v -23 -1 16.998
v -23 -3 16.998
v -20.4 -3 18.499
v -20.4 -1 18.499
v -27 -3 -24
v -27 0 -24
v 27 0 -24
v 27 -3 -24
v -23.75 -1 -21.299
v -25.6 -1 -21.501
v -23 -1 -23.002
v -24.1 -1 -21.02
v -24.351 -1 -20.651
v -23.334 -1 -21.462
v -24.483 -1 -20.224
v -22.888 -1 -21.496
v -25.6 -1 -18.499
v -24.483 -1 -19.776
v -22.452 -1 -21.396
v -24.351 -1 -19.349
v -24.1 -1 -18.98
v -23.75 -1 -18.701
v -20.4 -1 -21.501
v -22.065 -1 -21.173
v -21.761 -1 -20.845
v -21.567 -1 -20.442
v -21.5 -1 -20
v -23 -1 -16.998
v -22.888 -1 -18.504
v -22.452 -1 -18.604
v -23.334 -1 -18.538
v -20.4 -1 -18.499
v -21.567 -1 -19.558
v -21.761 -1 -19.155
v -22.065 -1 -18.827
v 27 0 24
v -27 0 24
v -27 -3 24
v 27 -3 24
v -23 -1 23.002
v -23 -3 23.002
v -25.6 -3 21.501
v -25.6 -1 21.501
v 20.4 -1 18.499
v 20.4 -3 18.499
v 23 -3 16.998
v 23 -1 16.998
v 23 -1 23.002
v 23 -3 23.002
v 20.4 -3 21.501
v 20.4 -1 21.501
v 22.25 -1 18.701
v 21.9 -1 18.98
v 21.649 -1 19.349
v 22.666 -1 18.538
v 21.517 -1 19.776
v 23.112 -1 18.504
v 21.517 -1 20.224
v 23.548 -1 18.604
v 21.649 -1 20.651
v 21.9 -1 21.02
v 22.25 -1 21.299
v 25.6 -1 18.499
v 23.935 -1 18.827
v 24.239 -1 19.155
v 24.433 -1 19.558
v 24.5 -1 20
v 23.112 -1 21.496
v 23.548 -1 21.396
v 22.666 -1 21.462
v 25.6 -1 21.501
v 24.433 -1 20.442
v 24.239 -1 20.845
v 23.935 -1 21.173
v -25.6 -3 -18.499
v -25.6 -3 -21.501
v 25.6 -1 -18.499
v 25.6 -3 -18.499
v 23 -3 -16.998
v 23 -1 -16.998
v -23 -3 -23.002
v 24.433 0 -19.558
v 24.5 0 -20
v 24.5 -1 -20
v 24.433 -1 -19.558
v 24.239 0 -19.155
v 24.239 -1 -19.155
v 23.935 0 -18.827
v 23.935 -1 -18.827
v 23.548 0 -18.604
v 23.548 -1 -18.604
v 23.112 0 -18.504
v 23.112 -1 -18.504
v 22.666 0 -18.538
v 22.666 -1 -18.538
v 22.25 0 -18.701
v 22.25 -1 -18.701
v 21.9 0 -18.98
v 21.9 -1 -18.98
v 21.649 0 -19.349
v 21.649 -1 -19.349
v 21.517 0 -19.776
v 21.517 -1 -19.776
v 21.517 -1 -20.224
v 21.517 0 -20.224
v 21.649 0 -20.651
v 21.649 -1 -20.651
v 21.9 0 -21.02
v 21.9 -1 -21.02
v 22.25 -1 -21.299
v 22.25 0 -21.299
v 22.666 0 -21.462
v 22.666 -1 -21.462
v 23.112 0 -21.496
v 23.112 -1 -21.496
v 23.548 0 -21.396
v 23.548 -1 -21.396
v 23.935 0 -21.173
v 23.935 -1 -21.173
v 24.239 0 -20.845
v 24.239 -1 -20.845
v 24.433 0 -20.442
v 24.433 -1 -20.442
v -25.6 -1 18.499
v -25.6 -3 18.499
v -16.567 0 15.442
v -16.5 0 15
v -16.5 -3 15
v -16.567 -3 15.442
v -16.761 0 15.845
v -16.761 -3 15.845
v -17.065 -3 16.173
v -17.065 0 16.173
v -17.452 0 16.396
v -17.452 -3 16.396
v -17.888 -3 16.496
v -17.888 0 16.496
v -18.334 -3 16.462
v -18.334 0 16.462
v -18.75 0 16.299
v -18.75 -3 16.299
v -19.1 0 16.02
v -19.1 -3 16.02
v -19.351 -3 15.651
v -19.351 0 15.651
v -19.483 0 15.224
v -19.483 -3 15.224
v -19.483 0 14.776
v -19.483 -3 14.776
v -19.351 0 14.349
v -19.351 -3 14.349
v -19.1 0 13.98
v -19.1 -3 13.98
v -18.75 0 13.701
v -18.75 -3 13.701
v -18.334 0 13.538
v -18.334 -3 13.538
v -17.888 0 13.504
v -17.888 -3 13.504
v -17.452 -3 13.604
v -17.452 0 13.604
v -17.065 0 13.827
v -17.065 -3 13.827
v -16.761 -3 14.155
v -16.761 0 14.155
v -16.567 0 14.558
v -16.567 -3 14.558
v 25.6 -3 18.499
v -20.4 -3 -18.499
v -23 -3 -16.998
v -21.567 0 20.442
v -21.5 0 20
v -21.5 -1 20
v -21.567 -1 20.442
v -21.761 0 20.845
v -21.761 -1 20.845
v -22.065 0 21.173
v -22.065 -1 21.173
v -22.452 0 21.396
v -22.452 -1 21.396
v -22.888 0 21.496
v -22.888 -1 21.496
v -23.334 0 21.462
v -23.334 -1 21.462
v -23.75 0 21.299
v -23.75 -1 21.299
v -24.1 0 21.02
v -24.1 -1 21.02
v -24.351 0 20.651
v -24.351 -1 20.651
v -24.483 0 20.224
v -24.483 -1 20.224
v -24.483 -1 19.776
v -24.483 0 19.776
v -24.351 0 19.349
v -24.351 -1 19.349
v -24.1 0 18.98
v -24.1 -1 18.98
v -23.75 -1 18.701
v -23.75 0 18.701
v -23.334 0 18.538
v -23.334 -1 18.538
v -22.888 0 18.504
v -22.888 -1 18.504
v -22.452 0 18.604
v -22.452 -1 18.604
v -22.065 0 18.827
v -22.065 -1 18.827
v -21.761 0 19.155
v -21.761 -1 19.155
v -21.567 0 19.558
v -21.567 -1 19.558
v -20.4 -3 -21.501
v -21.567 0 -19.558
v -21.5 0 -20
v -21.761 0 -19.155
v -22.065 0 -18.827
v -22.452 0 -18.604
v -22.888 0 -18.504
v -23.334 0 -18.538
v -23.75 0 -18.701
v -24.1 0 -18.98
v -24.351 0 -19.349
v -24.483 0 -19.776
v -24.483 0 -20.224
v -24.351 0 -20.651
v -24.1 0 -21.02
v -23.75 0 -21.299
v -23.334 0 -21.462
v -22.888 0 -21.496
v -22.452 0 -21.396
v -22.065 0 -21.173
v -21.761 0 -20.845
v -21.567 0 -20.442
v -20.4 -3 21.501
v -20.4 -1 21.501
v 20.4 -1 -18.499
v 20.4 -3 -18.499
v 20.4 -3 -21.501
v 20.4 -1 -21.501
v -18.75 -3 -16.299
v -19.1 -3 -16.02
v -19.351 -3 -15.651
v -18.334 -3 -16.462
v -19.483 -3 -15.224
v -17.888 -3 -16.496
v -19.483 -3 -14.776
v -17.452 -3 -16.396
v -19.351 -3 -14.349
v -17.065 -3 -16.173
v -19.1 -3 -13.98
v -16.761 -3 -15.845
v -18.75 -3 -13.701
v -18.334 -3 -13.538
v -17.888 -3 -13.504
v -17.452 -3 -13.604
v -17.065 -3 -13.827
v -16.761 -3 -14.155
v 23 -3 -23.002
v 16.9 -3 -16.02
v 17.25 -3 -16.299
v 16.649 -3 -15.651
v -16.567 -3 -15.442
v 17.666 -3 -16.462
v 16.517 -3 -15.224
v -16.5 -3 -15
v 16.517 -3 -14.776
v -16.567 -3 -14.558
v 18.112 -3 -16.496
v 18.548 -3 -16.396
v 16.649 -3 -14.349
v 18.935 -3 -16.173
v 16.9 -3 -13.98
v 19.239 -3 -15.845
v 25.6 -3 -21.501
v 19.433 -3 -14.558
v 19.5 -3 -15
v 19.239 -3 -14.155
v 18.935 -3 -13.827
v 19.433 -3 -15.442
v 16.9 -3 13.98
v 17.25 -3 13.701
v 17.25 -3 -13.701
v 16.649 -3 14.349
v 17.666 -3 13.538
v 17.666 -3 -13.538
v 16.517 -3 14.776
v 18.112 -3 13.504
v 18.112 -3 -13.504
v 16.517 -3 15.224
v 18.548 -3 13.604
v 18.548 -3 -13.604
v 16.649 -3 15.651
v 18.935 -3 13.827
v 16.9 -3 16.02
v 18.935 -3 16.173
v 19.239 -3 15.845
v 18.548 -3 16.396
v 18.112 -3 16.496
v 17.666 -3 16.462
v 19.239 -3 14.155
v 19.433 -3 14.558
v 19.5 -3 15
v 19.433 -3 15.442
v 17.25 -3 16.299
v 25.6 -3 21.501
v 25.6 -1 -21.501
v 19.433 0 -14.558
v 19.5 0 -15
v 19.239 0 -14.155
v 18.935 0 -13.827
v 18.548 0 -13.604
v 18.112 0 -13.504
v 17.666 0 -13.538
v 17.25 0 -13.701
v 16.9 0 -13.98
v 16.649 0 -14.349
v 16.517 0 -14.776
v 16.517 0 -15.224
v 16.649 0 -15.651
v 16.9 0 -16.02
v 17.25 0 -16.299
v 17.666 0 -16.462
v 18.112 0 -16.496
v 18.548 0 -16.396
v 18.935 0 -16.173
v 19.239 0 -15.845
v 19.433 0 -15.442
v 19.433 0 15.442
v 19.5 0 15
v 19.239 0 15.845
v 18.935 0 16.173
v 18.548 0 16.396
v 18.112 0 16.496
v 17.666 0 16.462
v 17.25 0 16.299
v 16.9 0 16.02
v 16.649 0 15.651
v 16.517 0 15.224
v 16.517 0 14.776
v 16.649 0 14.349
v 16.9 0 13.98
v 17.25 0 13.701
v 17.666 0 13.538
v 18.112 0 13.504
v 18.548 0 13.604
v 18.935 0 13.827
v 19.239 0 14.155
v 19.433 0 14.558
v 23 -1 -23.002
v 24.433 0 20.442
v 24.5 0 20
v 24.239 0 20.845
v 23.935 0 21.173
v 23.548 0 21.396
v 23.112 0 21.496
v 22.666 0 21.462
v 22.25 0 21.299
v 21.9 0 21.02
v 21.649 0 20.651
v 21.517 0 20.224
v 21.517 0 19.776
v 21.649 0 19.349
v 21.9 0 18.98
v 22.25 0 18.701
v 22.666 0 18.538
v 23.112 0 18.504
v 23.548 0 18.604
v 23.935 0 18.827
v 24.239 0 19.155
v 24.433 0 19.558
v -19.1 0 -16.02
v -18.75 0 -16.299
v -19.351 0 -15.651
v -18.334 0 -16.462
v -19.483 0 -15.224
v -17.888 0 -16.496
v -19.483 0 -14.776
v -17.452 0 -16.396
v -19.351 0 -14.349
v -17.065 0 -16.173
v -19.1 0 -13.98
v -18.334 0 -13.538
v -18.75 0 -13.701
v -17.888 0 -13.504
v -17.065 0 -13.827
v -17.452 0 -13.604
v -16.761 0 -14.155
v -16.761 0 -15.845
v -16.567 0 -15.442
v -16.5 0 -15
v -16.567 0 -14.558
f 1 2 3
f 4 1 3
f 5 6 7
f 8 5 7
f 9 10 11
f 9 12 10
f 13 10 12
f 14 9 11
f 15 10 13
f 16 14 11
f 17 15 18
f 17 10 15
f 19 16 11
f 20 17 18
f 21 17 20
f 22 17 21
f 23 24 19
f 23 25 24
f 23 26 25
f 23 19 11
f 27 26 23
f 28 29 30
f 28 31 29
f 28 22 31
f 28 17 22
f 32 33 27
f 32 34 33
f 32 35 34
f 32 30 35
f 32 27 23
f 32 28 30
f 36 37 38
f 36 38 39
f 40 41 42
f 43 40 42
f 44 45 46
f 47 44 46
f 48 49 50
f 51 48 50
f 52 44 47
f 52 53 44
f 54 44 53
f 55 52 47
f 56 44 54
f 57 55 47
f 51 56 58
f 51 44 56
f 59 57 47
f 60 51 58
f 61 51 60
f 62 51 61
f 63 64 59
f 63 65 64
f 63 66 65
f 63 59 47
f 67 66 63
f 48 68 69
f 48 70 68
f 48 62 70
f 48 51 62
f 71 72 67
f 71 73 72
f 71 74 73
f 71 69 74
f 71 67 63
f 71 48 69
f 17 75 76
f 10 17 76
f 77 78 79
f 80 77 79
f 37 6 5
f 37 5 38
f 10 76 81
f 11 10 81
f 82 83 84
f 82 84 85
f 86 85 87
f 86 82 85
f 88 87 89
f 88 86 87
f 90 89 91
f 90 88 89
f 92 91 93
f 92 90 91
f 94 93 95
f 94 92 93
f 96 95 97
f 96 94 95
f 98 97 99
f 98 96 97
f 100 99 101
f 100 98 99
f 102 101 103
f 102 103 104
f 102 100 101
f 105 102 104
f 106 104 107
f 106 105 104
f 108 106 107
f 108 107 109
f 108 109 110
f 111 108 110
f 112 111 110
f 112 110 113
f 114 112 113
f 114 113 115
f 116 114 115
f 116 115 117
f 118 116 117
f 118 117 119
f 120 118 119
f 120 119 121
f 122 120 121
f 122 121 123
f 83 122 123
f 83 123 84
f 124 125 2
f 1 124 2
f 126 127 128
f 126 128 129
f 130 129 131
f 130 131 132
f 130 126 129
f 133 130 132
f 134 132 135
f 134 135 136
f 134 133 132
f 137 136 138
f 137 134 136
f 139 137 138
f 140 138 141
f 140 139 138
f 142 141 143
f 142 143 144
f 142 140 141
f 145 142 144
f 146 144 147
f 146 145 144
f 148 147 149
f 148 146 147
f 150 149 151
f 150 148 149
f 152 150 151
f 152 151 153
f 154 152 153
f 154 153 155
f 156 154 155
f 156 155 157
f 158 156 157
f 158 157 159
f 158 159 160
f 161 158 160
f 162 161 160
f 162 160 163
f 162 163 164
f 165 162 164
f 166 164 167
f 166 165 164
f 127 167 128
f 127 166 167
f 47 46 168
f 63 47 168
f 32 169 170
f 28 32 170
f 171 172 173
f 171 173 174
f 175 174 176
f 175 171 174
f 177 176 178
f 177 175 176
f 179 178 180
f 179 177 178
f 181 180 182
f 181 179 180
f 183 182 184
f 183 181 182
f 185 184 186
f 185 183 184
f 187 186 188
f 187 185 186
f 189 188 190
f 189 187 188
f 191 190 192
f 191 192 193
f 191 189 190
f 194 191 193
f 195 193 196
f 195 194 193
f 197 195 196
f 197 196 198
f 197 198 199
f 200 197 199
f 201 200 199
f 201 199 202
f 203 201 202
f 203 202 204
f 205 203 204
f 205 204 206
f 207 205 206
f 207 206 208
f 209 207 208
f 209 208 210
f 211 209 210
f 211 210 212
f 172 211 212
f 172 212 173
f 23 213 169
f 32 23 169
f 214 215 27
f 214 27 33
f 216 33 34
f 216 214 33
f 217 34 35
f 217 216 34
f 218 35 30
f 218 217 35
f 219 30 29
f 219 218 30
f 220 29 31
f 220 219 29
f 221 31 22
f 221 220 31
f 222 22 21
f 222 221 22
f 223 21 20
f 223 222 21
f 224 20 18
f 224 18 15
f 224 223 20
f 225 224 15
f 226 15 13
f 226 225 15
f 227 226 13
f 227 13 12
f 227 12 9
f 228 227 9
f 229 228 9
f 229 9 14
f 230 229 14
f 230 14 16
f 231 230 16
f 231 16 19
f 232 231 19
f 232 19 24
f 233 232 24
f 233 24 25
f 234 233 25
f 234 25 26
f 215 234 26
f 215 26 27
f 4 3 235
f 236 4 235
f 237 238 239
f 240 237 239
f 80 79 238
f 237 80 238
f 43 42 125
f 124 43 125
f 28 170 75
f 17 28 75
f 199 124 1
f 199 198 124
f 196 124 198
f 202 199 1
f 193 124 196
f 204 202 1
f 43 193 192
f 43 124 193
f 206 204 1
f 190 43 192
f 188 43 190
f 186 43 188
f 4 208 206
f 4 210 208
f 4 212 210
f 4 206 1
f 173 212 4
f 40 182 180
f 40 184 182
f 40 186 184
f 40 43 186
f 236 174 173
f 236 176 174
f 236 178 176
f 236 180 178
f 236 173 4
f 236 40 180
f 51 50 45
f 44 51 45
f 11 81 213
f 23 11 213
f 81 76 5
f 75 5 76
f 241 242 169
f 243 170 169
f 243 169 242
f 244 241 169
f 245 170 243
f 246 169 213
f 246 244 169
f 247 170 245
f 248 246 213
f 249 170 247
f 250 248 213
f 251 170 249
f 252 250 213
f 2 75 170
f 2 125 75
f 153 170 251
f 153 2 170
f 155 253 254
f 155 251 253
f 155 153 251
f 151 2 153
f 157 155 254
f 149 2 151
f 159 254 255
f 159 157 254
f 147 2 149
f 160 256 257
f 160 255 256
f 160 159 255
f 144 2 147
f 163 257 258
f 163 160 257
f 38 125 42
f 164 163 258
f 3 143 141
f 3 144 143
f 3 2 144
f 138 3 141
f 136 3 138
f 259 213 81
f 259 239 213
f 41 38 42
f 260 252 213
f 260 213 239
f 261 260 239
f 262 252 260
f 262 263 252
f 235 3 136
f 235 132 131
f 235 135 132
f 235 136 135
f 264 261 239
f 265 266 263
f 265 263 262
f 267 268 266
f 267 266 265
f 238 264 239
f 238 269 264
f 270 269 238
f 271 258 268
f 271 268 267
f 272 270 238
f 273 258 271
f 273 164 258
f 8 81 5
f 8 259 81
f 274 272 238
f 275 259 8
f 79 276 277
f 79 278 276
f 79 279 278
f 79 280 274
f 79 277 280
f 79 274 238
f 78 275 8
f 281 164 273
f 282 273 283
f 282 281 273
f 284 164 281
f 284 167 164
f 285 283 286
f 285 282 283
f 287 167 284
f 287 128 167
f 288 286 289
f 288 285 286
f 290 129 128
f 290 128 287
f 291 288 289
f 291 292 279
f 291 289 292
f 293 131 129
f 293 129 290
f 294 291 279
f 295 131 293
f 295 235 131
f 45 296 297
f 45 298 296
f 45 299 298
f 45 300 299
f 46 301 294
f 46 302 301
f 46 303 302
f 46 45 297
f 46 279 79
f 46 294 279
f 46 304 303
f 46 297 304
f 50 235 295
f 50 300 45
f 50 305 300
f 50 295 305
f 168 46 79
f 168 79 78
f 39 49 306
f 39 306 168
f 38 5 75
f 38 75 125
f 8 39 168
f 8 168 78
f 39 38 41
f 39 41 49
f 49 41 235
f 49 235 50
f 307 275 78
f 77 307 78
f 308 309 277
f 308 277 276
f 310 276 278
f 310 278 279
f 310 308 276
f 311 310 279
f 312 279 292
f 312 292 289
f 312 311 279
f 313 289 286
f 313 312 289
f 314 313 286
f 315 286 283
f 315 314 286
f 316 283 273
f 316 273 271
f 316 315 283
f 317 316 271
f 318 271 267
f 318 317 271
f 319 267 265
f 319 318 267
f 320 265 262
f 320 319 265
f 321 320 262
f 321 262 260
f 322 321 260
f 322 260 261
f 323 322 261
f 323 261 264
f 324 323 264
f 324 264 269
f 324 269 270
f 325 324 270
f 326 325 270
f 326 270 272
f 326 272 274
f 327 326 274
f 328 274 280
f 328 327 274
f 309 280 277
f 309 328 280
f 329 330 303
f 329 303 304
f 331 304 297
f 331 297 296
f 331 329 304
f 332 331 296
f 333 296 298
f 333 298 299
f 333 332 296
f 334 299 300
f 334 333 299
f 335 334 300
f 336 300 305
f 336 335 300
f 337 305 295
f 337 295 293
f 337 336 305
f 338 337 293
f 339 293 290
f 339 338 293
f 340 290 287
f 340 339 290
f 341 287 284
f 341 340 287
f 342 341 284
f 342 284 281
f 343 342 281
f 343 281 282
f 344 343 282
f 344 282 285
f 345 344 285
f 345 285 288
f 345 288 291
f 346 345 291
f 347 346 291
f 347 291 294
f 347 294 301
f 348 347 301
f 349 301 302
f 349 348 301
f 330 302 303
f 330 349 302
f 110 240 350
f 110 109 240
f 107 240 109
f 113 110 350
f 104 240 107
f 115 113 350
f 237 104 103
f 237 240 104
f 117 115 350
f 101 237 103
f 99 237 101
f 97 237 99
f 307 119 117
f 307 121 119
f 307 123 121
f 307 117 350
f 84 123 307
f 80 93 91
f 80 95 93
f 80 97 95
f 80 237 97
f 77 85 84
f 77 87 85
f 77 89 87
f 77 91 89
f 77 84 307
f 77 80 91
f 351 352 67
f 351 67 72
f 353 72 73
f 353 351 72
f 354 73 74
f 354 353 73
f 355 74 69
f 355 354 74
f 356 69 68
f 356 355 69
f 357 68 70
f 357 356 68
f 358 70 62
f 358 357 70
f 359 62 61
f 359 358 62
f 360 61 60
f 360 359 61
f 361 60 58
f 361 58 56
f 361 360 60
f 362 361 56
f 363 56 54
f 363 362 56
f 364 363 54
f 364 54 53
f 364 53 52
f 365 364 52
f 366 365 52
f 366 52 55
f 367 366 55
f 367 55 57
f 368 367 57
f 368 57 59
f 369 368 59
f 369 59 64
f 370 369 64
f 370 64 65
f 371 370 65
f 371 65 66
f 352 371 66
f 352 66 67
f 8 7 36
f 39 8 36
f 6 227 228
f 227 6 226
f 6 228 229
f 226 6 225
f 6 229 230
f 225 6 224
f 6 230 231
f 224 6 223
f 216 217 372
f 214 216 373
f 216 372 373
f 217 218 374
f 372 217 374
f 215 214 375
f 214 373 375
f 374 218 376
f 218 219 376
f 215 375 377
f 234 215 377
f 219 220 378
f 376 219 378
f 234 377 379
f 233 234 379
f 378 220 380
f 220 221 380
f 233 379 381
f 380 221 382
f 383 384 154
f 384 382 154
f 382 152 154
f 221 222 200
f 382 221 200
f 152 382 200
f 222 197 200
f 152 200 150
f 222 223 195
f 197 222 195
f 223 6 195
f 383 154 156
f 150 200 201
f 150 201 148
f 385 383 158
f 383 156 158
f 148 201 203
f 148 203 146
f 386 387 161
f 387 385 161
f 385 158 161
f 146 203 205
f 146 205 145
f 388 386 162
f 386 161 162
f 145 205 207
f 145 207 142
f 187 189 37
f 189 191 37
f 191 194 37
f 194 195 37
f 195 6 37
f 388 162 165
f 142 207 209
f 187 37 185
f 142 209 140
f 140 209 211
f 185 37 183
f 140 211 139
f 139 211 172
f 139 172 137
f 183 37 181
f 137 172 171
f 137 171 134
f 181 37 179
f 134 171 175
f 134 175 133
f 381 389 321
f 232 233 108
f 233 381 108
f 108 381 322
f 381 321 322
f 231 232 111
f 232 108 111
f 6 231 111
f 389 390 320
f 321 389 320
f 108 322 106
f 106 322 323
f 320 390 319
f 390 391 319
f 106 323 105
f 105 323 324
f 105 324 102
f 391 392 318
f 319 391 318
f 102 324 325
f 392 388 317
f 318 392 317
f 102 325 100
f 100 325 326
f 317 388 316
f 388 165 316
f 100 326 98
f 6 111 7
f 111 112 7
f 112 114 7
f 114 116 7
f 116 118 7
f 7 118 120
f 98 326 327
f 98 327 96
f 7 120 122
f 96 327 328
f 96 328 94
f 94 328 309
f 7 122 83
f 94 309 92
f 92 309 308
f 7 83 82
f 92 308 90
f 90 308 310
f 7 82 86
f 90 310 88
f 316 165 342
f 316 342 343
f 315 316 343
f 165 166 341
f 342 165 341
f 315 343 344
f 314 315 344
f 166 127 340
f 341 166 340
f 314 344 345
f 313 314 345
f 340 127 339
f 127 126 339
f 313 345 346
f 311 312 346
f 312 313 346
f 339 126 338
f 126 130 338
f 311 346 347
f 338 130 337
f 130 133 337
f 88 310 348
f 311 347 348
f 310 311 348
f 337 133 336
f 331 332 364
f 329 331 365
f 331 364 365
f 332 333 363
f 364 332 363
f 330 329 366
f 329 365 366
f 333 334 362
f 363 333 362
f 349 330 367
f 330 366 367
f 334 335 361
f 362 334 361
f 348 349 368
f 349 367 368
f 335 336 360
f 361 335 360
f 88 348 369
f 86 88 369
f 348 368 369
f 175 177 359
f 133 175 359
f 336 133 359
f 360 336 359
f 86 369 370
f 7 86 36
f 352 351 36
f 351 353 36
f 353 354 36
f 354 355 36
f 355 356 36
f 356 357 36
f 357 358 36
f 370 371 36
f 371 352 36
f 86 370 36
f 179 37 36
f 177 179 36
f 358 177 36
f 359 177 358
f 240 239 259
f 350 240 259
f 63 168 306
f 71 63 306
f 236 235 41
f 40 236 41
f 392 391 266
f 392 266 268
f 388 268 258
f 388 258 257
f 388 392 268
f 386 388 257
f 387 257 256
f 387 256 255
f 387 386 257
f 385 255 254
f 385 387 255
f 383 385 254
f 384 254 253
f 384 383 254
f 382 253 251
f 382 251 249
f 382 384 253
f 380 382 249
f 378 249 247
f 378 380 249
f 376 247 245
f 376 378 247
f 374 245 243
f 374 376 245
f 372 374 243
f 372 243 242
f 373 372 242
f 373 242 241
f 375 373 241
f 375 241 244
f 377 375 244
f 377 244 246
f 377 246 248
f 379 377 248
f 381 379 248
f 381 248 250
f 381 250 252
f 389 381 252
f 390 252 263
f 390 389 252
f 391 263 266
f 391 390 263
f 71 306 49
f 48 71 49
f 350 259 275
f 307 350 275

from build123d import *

# Parameters (mm, degrees)
F0_W     = 54
F0_H     = 48
F0_R     = 1.5
F1_DEPTH = 3
F2_R     = 1.5
F3_DEPTH = 2


with BuildPart() as f1:
    # F0 (on Front) → F1 (new body)
    with BuildSketch(Plane.XZ):
        Rectangle(F0_W, F0_H)
        with Locations((-23, -20)):
            Circle(F0_R, mode=Mode.SUBTRACT)
        with Locations((-18, -15)):
            Circle(F0_R, mode=Mode.SUBTRACT)
        with Locations((23, -20)):
            Circle(F0_R, mode=Mode.SUBTRACT)
        with Locations((18, -15)):
            Circle(F0_R, mode=Mode.SUBTRACT)
        with Locations((-18, 15)):
            Circle(F0_R, mode=Mode.SUBTRACT)
        with Locations((-23, 20)):
            Circle(F0_R, mode=Mode.SUBTRACT)
        with Locations((18, 15)):
            Circle(F0_R, mode=Mode.SUBTRACT)
        with Locations((23, 20)):
            Circle(F0_R, mode=Mode.SUBTRACT)
    extrude(amount=F1_DEPTH)

    # F2 (on face) → F3 (cut)
    with BuildSketch(Plane.XZ.offset(3)):
        Polygon((-25.6, -18.498889), (-25.6, -21.501111), (-23, -23.002221), (-20.4, -21.501111), (-20.4, -18.498889), (-23, -16.997779), align=None)
        with Locations((-23, -20)):
            Circle(F2_R, mode=Mode.SUBTRACT)
        Polygon((23, -16.997779), (20.4, -18.498889), (20.4, -21.501111), (23, -23.002221), (25.6, -21.501111), (25.6, -18.498889), align=None)
        with Locations((23, -20)):
            Circle(F2_R, mode=Mode.SUBTRACT)
        Polygon((-25.6, 21.501111), (-25.6, 18.498889), (-23, 16.997779), (-20.4, 18.498889), (-20.4, 21.501111), (-23, 23.002221), align=None)
        with Locations((-23, 20)):
            Circle(F2_R, mode=Mode.SUBTRACT)
        Polygon((20.4, 18.498889), (23, 16.997779), (25.6, 18.498889), (25.6, 21.501111), (23, 23.002221), (20.4, 21.501111), align=None)
        with Locations((23, 20)):
            Circle(F2_R, mode=Mode.SUBTRACT)
    extrude(amount=-F3_DEPTH, mode=Mode.SUBTRACT)


solid = f1.part
